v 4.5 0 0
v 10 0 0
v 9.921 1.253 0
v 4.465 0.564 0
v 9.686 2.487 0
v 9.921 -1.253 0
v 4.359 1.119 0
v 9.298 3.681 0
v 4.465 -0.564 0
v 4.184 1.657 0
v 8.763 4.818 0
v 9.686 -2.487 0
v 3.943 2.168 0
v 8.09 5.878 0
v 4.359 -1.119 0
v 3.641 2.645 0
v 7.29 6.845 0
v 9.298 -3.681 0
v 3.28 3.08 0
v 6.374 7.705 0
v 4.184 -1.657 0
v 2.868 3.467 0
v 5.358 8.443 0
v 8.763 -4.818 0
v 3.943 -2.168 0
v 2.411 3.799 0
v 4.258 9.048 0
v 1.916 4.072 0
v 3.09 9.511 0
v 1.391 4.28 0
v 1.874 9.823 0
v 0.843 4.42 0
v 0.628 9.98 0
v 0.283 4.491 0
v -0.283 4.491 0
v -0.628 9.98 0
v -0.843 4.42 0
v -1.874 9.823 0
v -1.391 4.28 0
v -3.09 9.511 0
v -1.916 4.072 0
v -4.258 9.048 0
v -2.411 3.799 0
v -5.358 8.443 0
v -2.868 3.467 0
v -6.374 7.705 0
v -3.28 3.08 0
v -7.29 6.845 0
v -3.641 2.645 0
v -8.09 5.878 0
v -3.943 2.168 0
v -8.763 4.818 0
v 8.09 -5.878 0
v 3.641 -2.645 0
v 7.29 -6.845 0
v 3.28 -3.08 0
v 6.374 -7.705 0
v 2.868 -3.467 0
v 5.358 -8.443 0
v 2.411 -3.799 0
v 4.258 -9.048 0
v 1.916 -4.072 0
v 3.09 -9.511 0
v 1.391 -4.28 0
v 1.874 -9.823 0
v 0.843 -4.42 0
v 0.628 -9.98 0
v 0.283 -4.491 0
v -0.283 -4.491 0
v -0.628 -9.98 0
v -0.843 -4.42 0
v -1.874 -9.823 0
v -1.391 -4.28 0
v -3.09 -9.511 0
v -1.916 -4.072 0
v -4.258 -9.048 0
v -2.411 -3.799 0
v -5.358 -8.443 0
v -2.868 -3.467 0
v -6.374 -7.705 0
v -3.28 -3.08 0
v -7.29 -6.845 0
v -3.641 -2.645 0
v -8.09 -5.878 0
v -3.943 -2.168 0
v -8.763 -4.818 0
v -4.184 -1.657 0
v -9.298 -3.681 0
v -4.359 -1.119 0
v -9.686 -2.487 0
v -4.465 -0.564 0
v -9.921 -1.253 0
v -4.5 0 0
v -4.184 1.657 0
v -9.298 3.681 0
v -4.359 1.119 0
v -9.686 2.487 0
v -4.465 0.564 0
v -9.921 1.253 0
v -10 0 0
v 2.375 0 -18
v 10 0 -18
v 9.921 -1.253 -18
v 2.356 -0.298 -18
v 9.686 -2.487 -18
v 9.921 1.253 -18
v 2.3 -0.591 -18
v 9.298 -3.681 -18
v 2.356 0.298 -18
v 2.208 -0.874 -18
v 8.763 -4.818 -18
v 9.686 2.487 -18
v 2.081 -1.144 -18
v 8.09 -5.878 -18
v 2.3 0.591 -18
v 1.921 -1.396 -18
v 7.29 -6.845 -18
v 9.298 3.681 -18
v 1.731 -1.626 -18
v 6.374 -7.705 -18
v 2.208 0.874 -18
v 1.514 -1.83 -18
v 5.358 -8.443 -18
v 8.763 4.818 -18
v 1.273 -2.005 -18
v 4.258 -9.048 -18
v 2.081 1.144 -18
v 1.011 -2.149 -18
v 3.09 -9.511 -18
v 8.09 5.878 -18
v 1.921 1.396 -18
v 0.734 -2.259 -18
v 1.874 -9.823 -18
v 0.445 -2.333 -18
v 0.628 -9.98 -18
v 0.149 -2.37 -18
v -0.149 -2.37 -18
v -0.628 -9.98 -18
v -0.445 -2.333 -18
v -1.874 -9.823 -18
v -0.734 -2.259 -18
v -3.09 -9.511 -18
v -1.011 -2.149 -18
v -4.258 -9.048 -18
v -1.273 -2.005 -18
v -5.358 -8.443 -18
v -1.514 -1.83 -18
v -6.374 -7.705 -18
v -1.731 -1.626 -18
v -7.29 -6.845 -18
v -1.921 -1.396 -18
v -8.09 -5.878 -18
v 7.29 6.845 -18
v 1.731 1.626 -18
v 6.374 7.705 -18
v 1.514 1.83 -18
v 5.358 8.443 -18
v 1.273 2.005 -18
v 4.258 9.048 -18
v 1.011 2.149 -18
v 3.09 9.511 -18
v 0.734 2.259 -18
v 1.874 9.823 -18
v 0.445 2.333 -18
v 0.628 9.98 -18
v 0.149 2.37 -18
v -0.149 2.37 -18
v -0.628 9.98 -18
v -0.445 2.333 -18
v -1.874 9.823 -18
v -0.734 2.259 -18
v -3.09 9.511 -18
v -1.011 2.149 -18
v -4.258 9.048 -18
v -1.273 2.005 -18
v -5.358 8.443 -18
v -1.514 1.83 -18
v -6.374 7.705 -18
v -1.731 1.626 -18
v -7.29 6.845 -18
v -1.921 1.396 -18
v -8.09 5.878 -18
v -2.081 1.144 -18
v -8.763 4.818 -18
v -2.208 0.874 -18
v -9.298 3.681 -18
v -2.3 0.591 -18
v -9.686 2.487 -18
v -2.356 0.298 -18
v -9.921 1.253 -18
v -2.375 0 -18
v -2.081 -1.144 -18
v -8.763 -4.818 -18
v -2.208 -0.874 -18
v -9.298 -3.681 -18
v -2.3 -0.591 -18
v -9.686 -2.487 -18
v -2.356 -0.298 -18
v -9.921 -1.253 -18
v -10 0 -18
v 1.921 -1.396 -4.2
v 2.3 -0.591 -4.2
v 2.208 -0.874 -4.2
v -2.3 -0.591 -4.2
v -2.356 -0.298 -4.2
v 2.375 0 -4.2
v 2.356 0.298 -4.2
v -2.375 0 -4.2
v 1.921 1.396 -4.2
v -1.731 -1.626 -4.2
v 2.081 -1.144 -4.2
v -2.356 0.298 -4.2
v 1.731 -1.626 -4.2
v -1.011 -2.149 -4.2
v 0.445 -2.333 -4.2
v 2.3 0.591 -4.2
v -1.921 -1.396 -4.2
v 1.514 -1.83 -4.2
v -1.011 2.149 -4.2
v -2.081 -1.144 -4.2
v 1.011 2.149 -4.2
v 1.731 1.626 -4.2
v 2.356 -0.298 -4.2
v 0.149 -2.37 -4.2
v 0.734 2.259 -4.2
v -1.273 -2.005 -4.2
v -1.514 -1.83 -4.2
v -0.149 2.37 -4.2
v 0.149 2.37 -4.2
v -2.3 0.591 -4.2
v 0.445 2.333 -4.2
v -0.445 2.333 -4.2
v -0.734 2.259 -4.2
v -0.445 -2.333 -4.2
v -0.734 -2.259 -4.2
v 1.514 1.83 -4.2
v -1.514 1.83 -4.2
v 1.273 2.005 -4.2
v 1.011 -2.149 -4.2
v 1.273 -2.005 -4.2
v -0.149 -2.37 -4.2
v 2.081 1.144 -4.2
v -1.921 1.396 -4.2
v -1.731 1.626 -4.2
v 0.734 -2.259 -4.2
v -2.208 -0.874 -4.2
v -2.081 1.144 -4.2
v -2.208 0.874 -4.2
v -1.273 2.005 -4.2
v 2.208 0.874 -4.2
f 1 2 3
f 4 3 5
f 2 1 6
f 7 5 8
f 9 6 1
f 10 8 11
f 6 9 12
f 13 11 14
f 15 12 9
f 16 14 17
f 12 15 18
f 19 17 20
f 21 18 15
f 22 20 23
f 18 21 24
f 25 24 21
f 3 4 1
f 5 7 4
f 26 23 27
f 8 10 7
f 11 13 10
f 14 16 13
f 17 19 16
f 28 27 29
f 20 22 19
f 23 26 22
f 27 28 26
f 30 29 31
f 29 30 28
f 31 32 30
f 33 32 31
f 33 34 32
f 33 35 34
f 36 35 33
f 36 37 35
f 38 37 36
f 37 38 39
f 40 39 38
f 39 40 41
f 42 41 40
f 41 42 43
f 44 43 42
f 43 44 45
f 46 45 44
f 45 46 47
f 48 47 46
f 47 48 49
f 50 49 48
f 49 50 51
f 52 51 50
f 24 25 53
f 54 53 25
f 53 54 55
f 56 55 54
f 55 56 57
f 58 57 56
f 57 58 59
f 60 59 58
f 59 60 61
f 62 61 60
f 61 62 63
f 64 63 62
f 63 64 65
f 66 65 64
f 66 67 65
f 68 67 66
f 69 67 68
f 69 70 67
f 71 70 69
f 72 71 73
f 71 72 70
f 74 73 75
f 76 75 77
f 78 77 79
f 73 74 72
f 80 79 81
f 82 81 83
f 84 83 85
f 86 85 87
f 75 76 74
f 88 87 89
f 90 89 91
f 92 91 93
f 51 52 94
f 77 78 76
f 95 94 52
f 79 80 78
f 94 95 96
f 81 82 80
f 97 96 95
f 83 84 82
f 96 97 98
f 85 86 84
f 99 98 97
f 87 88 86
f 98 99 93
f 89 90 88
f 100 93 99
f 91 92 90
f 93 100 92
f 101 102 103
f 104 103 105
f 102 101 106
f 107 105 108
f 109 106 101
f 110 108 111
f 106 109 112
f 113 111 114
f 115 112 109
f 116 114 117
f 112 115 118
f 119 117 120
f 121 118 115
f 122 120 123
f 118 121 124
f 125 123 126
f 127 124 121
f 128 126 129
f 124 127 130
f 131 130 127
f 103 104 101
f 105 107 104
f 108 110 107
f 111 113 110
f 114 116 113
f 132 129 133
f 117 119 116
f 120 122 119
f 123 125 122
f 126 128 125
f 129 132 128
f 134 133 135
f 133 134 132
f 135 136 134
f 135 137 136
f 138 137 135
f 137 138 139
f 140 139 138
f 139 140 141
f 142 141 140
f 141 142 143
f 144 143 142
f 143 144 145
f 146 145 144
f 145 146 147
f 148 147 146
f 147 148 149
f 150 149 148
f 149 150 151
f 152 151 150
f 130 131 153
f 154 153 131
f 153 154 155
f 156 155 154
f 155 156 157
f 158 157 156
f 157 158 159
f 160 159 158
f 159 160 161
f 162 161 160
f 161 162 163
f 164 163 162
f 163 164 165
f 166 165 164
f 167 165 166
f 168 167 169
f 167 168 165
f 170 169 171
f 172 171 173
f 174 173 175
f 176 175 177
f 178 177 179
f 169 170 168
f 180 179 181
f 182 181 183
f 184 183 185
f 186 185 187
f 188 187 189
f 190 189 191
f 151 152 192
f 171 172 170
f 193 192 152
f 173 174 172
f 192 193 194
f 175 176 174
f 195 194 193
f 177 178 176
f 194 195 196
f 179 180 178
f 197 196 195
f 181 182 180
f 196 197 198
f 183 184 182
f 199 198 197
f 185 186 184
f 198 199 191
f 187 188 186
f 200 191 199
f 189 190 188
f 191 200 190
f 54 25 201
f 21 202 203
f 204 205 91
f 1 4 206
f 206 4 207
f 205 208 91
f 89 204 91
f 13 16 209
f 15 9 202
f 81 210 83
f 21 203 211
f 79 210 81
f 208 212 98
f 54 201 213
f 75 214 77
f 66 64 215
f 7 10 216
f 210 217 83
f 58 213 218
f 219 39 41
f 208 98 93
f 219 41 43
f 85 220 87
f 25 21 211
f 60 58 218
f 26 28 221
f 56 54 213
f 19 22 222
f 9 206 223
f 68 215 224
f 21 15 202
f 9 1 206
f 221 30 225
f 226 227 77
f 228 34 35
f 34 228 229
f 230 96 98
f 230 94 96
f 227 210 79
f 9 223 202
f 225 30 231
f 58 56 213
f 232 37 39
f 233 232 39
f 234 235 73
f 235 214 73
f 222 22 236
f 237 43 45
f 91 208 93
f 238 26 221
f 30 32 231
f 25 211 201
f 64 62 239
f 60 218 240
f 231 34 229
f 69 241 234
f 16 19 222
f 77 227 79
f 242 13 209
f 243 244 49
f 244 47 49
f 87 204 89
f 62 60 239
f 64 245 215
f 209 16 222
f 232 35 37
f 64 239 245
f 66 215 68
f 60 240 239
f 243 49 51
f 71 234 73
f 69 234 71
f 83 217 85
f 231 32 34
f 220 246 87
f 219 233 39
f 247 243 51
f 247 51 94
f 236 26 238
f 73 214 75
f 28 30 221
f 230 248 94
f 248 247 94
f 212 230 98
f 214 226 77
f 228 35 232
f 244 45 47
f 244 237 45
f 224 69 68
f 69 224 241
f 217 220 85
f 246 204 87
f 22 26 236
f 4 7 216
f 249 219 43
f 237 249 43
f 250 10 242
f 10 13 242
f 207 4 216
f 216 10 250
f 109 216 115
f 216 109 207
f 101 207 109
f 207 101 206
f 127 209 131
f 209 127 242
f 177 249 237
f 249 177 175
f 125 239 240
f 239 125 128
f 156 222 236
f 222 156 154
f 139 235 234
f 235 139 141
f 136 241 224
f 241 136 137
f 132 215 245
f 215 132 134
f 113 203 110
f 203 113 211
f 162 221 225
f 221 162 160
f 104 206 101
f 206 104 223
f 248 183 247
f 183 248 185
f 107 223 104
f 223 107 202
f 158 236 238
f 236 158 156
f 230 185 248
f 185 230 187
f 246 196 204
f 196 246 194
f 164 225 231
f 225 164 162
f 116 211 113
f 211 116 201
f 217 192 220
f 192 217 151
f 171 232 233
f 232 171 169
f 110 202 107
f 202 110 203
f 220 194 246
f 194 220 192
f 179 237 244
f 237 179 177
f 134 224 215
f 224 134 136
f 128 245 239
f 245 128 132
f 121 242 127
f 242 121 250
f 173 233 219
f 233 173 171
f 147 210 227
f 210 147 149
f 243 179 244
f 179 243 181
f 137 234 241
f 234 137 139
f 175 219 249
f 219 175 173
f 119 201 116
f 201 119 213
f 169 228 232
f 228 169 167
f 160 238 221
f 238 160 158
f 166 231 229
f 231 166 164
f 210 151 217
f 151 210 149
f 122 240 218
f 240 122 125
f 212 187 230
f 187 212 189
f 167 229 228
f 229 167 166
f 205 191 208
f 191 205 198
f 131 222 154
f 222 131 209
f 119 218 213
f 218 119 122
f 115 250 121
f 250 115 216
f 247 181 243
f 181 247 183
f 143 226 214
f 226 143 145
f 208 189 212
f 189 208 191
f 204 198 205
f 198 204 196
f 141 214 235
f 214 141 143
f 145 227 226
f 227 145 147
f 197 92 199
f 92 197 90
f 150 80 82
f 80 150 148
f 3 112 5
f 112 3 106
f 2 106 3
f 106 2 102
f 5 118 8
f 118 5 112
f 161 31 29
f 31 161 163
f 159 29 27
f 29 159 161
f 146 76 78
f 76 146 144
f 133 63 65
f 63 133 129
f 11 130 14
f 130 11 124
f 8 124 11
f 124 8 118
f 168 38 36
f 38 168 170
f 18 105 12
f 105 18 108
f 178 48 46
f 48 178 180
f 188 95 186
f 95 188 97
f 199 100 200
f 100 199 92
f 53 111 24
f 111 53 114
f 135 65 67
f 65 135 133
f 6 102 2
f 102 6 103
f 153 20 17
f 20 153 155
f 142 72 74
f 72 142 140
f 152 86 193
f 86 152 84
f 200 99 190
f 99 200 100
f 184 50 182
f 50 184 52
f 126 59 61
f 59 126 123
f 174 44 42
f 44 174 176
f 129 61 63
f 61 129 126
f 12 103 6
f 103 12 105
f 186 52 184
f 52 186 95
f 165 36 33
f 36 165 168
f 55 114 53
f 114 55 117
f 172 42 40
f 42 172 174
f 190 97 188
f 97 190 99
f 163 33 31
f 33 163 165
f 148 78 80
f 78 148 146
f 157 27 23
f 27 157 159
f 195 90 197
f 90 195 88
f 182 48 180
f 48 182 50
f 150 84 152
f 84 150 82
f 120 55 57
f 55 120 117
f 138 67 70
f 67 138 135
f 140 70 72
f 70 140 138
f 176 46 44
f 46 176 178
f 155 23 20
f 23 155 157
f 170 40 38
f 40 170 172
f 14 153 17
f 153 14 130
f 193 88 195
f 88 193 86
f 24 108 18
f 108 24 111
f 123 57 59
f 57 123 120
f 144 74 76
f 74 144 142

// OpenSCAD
$fn = 50;


difference() {
	union() {
		translate(v = [0, 0, -18.0000000000]) {
			cylinder(h = 18, r = 10.0000000000);
		}
		cylinder(h = 0, r = 19.0000000000);
	}
	union() {
		translate(v = [0, 0, 0]) {
			rotate(a = [0, 0, 0]) {
				difference() {
					union() {
						#translate(v = [0, 0, -18.0000000000]) {
							cylinder(h = 18, r = 2.2500000000);
						}
						#translate(v = [0, 0, -4.2000000000]) {
							cylinder(h = 4.2000000000, r = 10.0000000000, r1 = 2.3750000000, r2 = 4.5000000000);
						}
						#translate(v = [0, 0, -18.0000000000]) {
							cylinder(h = 18, r = 2.3750000000);
						}
						#translate(v = [0, 0, -18.0000000000]) {
							cylinder(h = 18, r = 2.2500000000);
						}
					}
					union();
				}
			}
		}
	}
}
